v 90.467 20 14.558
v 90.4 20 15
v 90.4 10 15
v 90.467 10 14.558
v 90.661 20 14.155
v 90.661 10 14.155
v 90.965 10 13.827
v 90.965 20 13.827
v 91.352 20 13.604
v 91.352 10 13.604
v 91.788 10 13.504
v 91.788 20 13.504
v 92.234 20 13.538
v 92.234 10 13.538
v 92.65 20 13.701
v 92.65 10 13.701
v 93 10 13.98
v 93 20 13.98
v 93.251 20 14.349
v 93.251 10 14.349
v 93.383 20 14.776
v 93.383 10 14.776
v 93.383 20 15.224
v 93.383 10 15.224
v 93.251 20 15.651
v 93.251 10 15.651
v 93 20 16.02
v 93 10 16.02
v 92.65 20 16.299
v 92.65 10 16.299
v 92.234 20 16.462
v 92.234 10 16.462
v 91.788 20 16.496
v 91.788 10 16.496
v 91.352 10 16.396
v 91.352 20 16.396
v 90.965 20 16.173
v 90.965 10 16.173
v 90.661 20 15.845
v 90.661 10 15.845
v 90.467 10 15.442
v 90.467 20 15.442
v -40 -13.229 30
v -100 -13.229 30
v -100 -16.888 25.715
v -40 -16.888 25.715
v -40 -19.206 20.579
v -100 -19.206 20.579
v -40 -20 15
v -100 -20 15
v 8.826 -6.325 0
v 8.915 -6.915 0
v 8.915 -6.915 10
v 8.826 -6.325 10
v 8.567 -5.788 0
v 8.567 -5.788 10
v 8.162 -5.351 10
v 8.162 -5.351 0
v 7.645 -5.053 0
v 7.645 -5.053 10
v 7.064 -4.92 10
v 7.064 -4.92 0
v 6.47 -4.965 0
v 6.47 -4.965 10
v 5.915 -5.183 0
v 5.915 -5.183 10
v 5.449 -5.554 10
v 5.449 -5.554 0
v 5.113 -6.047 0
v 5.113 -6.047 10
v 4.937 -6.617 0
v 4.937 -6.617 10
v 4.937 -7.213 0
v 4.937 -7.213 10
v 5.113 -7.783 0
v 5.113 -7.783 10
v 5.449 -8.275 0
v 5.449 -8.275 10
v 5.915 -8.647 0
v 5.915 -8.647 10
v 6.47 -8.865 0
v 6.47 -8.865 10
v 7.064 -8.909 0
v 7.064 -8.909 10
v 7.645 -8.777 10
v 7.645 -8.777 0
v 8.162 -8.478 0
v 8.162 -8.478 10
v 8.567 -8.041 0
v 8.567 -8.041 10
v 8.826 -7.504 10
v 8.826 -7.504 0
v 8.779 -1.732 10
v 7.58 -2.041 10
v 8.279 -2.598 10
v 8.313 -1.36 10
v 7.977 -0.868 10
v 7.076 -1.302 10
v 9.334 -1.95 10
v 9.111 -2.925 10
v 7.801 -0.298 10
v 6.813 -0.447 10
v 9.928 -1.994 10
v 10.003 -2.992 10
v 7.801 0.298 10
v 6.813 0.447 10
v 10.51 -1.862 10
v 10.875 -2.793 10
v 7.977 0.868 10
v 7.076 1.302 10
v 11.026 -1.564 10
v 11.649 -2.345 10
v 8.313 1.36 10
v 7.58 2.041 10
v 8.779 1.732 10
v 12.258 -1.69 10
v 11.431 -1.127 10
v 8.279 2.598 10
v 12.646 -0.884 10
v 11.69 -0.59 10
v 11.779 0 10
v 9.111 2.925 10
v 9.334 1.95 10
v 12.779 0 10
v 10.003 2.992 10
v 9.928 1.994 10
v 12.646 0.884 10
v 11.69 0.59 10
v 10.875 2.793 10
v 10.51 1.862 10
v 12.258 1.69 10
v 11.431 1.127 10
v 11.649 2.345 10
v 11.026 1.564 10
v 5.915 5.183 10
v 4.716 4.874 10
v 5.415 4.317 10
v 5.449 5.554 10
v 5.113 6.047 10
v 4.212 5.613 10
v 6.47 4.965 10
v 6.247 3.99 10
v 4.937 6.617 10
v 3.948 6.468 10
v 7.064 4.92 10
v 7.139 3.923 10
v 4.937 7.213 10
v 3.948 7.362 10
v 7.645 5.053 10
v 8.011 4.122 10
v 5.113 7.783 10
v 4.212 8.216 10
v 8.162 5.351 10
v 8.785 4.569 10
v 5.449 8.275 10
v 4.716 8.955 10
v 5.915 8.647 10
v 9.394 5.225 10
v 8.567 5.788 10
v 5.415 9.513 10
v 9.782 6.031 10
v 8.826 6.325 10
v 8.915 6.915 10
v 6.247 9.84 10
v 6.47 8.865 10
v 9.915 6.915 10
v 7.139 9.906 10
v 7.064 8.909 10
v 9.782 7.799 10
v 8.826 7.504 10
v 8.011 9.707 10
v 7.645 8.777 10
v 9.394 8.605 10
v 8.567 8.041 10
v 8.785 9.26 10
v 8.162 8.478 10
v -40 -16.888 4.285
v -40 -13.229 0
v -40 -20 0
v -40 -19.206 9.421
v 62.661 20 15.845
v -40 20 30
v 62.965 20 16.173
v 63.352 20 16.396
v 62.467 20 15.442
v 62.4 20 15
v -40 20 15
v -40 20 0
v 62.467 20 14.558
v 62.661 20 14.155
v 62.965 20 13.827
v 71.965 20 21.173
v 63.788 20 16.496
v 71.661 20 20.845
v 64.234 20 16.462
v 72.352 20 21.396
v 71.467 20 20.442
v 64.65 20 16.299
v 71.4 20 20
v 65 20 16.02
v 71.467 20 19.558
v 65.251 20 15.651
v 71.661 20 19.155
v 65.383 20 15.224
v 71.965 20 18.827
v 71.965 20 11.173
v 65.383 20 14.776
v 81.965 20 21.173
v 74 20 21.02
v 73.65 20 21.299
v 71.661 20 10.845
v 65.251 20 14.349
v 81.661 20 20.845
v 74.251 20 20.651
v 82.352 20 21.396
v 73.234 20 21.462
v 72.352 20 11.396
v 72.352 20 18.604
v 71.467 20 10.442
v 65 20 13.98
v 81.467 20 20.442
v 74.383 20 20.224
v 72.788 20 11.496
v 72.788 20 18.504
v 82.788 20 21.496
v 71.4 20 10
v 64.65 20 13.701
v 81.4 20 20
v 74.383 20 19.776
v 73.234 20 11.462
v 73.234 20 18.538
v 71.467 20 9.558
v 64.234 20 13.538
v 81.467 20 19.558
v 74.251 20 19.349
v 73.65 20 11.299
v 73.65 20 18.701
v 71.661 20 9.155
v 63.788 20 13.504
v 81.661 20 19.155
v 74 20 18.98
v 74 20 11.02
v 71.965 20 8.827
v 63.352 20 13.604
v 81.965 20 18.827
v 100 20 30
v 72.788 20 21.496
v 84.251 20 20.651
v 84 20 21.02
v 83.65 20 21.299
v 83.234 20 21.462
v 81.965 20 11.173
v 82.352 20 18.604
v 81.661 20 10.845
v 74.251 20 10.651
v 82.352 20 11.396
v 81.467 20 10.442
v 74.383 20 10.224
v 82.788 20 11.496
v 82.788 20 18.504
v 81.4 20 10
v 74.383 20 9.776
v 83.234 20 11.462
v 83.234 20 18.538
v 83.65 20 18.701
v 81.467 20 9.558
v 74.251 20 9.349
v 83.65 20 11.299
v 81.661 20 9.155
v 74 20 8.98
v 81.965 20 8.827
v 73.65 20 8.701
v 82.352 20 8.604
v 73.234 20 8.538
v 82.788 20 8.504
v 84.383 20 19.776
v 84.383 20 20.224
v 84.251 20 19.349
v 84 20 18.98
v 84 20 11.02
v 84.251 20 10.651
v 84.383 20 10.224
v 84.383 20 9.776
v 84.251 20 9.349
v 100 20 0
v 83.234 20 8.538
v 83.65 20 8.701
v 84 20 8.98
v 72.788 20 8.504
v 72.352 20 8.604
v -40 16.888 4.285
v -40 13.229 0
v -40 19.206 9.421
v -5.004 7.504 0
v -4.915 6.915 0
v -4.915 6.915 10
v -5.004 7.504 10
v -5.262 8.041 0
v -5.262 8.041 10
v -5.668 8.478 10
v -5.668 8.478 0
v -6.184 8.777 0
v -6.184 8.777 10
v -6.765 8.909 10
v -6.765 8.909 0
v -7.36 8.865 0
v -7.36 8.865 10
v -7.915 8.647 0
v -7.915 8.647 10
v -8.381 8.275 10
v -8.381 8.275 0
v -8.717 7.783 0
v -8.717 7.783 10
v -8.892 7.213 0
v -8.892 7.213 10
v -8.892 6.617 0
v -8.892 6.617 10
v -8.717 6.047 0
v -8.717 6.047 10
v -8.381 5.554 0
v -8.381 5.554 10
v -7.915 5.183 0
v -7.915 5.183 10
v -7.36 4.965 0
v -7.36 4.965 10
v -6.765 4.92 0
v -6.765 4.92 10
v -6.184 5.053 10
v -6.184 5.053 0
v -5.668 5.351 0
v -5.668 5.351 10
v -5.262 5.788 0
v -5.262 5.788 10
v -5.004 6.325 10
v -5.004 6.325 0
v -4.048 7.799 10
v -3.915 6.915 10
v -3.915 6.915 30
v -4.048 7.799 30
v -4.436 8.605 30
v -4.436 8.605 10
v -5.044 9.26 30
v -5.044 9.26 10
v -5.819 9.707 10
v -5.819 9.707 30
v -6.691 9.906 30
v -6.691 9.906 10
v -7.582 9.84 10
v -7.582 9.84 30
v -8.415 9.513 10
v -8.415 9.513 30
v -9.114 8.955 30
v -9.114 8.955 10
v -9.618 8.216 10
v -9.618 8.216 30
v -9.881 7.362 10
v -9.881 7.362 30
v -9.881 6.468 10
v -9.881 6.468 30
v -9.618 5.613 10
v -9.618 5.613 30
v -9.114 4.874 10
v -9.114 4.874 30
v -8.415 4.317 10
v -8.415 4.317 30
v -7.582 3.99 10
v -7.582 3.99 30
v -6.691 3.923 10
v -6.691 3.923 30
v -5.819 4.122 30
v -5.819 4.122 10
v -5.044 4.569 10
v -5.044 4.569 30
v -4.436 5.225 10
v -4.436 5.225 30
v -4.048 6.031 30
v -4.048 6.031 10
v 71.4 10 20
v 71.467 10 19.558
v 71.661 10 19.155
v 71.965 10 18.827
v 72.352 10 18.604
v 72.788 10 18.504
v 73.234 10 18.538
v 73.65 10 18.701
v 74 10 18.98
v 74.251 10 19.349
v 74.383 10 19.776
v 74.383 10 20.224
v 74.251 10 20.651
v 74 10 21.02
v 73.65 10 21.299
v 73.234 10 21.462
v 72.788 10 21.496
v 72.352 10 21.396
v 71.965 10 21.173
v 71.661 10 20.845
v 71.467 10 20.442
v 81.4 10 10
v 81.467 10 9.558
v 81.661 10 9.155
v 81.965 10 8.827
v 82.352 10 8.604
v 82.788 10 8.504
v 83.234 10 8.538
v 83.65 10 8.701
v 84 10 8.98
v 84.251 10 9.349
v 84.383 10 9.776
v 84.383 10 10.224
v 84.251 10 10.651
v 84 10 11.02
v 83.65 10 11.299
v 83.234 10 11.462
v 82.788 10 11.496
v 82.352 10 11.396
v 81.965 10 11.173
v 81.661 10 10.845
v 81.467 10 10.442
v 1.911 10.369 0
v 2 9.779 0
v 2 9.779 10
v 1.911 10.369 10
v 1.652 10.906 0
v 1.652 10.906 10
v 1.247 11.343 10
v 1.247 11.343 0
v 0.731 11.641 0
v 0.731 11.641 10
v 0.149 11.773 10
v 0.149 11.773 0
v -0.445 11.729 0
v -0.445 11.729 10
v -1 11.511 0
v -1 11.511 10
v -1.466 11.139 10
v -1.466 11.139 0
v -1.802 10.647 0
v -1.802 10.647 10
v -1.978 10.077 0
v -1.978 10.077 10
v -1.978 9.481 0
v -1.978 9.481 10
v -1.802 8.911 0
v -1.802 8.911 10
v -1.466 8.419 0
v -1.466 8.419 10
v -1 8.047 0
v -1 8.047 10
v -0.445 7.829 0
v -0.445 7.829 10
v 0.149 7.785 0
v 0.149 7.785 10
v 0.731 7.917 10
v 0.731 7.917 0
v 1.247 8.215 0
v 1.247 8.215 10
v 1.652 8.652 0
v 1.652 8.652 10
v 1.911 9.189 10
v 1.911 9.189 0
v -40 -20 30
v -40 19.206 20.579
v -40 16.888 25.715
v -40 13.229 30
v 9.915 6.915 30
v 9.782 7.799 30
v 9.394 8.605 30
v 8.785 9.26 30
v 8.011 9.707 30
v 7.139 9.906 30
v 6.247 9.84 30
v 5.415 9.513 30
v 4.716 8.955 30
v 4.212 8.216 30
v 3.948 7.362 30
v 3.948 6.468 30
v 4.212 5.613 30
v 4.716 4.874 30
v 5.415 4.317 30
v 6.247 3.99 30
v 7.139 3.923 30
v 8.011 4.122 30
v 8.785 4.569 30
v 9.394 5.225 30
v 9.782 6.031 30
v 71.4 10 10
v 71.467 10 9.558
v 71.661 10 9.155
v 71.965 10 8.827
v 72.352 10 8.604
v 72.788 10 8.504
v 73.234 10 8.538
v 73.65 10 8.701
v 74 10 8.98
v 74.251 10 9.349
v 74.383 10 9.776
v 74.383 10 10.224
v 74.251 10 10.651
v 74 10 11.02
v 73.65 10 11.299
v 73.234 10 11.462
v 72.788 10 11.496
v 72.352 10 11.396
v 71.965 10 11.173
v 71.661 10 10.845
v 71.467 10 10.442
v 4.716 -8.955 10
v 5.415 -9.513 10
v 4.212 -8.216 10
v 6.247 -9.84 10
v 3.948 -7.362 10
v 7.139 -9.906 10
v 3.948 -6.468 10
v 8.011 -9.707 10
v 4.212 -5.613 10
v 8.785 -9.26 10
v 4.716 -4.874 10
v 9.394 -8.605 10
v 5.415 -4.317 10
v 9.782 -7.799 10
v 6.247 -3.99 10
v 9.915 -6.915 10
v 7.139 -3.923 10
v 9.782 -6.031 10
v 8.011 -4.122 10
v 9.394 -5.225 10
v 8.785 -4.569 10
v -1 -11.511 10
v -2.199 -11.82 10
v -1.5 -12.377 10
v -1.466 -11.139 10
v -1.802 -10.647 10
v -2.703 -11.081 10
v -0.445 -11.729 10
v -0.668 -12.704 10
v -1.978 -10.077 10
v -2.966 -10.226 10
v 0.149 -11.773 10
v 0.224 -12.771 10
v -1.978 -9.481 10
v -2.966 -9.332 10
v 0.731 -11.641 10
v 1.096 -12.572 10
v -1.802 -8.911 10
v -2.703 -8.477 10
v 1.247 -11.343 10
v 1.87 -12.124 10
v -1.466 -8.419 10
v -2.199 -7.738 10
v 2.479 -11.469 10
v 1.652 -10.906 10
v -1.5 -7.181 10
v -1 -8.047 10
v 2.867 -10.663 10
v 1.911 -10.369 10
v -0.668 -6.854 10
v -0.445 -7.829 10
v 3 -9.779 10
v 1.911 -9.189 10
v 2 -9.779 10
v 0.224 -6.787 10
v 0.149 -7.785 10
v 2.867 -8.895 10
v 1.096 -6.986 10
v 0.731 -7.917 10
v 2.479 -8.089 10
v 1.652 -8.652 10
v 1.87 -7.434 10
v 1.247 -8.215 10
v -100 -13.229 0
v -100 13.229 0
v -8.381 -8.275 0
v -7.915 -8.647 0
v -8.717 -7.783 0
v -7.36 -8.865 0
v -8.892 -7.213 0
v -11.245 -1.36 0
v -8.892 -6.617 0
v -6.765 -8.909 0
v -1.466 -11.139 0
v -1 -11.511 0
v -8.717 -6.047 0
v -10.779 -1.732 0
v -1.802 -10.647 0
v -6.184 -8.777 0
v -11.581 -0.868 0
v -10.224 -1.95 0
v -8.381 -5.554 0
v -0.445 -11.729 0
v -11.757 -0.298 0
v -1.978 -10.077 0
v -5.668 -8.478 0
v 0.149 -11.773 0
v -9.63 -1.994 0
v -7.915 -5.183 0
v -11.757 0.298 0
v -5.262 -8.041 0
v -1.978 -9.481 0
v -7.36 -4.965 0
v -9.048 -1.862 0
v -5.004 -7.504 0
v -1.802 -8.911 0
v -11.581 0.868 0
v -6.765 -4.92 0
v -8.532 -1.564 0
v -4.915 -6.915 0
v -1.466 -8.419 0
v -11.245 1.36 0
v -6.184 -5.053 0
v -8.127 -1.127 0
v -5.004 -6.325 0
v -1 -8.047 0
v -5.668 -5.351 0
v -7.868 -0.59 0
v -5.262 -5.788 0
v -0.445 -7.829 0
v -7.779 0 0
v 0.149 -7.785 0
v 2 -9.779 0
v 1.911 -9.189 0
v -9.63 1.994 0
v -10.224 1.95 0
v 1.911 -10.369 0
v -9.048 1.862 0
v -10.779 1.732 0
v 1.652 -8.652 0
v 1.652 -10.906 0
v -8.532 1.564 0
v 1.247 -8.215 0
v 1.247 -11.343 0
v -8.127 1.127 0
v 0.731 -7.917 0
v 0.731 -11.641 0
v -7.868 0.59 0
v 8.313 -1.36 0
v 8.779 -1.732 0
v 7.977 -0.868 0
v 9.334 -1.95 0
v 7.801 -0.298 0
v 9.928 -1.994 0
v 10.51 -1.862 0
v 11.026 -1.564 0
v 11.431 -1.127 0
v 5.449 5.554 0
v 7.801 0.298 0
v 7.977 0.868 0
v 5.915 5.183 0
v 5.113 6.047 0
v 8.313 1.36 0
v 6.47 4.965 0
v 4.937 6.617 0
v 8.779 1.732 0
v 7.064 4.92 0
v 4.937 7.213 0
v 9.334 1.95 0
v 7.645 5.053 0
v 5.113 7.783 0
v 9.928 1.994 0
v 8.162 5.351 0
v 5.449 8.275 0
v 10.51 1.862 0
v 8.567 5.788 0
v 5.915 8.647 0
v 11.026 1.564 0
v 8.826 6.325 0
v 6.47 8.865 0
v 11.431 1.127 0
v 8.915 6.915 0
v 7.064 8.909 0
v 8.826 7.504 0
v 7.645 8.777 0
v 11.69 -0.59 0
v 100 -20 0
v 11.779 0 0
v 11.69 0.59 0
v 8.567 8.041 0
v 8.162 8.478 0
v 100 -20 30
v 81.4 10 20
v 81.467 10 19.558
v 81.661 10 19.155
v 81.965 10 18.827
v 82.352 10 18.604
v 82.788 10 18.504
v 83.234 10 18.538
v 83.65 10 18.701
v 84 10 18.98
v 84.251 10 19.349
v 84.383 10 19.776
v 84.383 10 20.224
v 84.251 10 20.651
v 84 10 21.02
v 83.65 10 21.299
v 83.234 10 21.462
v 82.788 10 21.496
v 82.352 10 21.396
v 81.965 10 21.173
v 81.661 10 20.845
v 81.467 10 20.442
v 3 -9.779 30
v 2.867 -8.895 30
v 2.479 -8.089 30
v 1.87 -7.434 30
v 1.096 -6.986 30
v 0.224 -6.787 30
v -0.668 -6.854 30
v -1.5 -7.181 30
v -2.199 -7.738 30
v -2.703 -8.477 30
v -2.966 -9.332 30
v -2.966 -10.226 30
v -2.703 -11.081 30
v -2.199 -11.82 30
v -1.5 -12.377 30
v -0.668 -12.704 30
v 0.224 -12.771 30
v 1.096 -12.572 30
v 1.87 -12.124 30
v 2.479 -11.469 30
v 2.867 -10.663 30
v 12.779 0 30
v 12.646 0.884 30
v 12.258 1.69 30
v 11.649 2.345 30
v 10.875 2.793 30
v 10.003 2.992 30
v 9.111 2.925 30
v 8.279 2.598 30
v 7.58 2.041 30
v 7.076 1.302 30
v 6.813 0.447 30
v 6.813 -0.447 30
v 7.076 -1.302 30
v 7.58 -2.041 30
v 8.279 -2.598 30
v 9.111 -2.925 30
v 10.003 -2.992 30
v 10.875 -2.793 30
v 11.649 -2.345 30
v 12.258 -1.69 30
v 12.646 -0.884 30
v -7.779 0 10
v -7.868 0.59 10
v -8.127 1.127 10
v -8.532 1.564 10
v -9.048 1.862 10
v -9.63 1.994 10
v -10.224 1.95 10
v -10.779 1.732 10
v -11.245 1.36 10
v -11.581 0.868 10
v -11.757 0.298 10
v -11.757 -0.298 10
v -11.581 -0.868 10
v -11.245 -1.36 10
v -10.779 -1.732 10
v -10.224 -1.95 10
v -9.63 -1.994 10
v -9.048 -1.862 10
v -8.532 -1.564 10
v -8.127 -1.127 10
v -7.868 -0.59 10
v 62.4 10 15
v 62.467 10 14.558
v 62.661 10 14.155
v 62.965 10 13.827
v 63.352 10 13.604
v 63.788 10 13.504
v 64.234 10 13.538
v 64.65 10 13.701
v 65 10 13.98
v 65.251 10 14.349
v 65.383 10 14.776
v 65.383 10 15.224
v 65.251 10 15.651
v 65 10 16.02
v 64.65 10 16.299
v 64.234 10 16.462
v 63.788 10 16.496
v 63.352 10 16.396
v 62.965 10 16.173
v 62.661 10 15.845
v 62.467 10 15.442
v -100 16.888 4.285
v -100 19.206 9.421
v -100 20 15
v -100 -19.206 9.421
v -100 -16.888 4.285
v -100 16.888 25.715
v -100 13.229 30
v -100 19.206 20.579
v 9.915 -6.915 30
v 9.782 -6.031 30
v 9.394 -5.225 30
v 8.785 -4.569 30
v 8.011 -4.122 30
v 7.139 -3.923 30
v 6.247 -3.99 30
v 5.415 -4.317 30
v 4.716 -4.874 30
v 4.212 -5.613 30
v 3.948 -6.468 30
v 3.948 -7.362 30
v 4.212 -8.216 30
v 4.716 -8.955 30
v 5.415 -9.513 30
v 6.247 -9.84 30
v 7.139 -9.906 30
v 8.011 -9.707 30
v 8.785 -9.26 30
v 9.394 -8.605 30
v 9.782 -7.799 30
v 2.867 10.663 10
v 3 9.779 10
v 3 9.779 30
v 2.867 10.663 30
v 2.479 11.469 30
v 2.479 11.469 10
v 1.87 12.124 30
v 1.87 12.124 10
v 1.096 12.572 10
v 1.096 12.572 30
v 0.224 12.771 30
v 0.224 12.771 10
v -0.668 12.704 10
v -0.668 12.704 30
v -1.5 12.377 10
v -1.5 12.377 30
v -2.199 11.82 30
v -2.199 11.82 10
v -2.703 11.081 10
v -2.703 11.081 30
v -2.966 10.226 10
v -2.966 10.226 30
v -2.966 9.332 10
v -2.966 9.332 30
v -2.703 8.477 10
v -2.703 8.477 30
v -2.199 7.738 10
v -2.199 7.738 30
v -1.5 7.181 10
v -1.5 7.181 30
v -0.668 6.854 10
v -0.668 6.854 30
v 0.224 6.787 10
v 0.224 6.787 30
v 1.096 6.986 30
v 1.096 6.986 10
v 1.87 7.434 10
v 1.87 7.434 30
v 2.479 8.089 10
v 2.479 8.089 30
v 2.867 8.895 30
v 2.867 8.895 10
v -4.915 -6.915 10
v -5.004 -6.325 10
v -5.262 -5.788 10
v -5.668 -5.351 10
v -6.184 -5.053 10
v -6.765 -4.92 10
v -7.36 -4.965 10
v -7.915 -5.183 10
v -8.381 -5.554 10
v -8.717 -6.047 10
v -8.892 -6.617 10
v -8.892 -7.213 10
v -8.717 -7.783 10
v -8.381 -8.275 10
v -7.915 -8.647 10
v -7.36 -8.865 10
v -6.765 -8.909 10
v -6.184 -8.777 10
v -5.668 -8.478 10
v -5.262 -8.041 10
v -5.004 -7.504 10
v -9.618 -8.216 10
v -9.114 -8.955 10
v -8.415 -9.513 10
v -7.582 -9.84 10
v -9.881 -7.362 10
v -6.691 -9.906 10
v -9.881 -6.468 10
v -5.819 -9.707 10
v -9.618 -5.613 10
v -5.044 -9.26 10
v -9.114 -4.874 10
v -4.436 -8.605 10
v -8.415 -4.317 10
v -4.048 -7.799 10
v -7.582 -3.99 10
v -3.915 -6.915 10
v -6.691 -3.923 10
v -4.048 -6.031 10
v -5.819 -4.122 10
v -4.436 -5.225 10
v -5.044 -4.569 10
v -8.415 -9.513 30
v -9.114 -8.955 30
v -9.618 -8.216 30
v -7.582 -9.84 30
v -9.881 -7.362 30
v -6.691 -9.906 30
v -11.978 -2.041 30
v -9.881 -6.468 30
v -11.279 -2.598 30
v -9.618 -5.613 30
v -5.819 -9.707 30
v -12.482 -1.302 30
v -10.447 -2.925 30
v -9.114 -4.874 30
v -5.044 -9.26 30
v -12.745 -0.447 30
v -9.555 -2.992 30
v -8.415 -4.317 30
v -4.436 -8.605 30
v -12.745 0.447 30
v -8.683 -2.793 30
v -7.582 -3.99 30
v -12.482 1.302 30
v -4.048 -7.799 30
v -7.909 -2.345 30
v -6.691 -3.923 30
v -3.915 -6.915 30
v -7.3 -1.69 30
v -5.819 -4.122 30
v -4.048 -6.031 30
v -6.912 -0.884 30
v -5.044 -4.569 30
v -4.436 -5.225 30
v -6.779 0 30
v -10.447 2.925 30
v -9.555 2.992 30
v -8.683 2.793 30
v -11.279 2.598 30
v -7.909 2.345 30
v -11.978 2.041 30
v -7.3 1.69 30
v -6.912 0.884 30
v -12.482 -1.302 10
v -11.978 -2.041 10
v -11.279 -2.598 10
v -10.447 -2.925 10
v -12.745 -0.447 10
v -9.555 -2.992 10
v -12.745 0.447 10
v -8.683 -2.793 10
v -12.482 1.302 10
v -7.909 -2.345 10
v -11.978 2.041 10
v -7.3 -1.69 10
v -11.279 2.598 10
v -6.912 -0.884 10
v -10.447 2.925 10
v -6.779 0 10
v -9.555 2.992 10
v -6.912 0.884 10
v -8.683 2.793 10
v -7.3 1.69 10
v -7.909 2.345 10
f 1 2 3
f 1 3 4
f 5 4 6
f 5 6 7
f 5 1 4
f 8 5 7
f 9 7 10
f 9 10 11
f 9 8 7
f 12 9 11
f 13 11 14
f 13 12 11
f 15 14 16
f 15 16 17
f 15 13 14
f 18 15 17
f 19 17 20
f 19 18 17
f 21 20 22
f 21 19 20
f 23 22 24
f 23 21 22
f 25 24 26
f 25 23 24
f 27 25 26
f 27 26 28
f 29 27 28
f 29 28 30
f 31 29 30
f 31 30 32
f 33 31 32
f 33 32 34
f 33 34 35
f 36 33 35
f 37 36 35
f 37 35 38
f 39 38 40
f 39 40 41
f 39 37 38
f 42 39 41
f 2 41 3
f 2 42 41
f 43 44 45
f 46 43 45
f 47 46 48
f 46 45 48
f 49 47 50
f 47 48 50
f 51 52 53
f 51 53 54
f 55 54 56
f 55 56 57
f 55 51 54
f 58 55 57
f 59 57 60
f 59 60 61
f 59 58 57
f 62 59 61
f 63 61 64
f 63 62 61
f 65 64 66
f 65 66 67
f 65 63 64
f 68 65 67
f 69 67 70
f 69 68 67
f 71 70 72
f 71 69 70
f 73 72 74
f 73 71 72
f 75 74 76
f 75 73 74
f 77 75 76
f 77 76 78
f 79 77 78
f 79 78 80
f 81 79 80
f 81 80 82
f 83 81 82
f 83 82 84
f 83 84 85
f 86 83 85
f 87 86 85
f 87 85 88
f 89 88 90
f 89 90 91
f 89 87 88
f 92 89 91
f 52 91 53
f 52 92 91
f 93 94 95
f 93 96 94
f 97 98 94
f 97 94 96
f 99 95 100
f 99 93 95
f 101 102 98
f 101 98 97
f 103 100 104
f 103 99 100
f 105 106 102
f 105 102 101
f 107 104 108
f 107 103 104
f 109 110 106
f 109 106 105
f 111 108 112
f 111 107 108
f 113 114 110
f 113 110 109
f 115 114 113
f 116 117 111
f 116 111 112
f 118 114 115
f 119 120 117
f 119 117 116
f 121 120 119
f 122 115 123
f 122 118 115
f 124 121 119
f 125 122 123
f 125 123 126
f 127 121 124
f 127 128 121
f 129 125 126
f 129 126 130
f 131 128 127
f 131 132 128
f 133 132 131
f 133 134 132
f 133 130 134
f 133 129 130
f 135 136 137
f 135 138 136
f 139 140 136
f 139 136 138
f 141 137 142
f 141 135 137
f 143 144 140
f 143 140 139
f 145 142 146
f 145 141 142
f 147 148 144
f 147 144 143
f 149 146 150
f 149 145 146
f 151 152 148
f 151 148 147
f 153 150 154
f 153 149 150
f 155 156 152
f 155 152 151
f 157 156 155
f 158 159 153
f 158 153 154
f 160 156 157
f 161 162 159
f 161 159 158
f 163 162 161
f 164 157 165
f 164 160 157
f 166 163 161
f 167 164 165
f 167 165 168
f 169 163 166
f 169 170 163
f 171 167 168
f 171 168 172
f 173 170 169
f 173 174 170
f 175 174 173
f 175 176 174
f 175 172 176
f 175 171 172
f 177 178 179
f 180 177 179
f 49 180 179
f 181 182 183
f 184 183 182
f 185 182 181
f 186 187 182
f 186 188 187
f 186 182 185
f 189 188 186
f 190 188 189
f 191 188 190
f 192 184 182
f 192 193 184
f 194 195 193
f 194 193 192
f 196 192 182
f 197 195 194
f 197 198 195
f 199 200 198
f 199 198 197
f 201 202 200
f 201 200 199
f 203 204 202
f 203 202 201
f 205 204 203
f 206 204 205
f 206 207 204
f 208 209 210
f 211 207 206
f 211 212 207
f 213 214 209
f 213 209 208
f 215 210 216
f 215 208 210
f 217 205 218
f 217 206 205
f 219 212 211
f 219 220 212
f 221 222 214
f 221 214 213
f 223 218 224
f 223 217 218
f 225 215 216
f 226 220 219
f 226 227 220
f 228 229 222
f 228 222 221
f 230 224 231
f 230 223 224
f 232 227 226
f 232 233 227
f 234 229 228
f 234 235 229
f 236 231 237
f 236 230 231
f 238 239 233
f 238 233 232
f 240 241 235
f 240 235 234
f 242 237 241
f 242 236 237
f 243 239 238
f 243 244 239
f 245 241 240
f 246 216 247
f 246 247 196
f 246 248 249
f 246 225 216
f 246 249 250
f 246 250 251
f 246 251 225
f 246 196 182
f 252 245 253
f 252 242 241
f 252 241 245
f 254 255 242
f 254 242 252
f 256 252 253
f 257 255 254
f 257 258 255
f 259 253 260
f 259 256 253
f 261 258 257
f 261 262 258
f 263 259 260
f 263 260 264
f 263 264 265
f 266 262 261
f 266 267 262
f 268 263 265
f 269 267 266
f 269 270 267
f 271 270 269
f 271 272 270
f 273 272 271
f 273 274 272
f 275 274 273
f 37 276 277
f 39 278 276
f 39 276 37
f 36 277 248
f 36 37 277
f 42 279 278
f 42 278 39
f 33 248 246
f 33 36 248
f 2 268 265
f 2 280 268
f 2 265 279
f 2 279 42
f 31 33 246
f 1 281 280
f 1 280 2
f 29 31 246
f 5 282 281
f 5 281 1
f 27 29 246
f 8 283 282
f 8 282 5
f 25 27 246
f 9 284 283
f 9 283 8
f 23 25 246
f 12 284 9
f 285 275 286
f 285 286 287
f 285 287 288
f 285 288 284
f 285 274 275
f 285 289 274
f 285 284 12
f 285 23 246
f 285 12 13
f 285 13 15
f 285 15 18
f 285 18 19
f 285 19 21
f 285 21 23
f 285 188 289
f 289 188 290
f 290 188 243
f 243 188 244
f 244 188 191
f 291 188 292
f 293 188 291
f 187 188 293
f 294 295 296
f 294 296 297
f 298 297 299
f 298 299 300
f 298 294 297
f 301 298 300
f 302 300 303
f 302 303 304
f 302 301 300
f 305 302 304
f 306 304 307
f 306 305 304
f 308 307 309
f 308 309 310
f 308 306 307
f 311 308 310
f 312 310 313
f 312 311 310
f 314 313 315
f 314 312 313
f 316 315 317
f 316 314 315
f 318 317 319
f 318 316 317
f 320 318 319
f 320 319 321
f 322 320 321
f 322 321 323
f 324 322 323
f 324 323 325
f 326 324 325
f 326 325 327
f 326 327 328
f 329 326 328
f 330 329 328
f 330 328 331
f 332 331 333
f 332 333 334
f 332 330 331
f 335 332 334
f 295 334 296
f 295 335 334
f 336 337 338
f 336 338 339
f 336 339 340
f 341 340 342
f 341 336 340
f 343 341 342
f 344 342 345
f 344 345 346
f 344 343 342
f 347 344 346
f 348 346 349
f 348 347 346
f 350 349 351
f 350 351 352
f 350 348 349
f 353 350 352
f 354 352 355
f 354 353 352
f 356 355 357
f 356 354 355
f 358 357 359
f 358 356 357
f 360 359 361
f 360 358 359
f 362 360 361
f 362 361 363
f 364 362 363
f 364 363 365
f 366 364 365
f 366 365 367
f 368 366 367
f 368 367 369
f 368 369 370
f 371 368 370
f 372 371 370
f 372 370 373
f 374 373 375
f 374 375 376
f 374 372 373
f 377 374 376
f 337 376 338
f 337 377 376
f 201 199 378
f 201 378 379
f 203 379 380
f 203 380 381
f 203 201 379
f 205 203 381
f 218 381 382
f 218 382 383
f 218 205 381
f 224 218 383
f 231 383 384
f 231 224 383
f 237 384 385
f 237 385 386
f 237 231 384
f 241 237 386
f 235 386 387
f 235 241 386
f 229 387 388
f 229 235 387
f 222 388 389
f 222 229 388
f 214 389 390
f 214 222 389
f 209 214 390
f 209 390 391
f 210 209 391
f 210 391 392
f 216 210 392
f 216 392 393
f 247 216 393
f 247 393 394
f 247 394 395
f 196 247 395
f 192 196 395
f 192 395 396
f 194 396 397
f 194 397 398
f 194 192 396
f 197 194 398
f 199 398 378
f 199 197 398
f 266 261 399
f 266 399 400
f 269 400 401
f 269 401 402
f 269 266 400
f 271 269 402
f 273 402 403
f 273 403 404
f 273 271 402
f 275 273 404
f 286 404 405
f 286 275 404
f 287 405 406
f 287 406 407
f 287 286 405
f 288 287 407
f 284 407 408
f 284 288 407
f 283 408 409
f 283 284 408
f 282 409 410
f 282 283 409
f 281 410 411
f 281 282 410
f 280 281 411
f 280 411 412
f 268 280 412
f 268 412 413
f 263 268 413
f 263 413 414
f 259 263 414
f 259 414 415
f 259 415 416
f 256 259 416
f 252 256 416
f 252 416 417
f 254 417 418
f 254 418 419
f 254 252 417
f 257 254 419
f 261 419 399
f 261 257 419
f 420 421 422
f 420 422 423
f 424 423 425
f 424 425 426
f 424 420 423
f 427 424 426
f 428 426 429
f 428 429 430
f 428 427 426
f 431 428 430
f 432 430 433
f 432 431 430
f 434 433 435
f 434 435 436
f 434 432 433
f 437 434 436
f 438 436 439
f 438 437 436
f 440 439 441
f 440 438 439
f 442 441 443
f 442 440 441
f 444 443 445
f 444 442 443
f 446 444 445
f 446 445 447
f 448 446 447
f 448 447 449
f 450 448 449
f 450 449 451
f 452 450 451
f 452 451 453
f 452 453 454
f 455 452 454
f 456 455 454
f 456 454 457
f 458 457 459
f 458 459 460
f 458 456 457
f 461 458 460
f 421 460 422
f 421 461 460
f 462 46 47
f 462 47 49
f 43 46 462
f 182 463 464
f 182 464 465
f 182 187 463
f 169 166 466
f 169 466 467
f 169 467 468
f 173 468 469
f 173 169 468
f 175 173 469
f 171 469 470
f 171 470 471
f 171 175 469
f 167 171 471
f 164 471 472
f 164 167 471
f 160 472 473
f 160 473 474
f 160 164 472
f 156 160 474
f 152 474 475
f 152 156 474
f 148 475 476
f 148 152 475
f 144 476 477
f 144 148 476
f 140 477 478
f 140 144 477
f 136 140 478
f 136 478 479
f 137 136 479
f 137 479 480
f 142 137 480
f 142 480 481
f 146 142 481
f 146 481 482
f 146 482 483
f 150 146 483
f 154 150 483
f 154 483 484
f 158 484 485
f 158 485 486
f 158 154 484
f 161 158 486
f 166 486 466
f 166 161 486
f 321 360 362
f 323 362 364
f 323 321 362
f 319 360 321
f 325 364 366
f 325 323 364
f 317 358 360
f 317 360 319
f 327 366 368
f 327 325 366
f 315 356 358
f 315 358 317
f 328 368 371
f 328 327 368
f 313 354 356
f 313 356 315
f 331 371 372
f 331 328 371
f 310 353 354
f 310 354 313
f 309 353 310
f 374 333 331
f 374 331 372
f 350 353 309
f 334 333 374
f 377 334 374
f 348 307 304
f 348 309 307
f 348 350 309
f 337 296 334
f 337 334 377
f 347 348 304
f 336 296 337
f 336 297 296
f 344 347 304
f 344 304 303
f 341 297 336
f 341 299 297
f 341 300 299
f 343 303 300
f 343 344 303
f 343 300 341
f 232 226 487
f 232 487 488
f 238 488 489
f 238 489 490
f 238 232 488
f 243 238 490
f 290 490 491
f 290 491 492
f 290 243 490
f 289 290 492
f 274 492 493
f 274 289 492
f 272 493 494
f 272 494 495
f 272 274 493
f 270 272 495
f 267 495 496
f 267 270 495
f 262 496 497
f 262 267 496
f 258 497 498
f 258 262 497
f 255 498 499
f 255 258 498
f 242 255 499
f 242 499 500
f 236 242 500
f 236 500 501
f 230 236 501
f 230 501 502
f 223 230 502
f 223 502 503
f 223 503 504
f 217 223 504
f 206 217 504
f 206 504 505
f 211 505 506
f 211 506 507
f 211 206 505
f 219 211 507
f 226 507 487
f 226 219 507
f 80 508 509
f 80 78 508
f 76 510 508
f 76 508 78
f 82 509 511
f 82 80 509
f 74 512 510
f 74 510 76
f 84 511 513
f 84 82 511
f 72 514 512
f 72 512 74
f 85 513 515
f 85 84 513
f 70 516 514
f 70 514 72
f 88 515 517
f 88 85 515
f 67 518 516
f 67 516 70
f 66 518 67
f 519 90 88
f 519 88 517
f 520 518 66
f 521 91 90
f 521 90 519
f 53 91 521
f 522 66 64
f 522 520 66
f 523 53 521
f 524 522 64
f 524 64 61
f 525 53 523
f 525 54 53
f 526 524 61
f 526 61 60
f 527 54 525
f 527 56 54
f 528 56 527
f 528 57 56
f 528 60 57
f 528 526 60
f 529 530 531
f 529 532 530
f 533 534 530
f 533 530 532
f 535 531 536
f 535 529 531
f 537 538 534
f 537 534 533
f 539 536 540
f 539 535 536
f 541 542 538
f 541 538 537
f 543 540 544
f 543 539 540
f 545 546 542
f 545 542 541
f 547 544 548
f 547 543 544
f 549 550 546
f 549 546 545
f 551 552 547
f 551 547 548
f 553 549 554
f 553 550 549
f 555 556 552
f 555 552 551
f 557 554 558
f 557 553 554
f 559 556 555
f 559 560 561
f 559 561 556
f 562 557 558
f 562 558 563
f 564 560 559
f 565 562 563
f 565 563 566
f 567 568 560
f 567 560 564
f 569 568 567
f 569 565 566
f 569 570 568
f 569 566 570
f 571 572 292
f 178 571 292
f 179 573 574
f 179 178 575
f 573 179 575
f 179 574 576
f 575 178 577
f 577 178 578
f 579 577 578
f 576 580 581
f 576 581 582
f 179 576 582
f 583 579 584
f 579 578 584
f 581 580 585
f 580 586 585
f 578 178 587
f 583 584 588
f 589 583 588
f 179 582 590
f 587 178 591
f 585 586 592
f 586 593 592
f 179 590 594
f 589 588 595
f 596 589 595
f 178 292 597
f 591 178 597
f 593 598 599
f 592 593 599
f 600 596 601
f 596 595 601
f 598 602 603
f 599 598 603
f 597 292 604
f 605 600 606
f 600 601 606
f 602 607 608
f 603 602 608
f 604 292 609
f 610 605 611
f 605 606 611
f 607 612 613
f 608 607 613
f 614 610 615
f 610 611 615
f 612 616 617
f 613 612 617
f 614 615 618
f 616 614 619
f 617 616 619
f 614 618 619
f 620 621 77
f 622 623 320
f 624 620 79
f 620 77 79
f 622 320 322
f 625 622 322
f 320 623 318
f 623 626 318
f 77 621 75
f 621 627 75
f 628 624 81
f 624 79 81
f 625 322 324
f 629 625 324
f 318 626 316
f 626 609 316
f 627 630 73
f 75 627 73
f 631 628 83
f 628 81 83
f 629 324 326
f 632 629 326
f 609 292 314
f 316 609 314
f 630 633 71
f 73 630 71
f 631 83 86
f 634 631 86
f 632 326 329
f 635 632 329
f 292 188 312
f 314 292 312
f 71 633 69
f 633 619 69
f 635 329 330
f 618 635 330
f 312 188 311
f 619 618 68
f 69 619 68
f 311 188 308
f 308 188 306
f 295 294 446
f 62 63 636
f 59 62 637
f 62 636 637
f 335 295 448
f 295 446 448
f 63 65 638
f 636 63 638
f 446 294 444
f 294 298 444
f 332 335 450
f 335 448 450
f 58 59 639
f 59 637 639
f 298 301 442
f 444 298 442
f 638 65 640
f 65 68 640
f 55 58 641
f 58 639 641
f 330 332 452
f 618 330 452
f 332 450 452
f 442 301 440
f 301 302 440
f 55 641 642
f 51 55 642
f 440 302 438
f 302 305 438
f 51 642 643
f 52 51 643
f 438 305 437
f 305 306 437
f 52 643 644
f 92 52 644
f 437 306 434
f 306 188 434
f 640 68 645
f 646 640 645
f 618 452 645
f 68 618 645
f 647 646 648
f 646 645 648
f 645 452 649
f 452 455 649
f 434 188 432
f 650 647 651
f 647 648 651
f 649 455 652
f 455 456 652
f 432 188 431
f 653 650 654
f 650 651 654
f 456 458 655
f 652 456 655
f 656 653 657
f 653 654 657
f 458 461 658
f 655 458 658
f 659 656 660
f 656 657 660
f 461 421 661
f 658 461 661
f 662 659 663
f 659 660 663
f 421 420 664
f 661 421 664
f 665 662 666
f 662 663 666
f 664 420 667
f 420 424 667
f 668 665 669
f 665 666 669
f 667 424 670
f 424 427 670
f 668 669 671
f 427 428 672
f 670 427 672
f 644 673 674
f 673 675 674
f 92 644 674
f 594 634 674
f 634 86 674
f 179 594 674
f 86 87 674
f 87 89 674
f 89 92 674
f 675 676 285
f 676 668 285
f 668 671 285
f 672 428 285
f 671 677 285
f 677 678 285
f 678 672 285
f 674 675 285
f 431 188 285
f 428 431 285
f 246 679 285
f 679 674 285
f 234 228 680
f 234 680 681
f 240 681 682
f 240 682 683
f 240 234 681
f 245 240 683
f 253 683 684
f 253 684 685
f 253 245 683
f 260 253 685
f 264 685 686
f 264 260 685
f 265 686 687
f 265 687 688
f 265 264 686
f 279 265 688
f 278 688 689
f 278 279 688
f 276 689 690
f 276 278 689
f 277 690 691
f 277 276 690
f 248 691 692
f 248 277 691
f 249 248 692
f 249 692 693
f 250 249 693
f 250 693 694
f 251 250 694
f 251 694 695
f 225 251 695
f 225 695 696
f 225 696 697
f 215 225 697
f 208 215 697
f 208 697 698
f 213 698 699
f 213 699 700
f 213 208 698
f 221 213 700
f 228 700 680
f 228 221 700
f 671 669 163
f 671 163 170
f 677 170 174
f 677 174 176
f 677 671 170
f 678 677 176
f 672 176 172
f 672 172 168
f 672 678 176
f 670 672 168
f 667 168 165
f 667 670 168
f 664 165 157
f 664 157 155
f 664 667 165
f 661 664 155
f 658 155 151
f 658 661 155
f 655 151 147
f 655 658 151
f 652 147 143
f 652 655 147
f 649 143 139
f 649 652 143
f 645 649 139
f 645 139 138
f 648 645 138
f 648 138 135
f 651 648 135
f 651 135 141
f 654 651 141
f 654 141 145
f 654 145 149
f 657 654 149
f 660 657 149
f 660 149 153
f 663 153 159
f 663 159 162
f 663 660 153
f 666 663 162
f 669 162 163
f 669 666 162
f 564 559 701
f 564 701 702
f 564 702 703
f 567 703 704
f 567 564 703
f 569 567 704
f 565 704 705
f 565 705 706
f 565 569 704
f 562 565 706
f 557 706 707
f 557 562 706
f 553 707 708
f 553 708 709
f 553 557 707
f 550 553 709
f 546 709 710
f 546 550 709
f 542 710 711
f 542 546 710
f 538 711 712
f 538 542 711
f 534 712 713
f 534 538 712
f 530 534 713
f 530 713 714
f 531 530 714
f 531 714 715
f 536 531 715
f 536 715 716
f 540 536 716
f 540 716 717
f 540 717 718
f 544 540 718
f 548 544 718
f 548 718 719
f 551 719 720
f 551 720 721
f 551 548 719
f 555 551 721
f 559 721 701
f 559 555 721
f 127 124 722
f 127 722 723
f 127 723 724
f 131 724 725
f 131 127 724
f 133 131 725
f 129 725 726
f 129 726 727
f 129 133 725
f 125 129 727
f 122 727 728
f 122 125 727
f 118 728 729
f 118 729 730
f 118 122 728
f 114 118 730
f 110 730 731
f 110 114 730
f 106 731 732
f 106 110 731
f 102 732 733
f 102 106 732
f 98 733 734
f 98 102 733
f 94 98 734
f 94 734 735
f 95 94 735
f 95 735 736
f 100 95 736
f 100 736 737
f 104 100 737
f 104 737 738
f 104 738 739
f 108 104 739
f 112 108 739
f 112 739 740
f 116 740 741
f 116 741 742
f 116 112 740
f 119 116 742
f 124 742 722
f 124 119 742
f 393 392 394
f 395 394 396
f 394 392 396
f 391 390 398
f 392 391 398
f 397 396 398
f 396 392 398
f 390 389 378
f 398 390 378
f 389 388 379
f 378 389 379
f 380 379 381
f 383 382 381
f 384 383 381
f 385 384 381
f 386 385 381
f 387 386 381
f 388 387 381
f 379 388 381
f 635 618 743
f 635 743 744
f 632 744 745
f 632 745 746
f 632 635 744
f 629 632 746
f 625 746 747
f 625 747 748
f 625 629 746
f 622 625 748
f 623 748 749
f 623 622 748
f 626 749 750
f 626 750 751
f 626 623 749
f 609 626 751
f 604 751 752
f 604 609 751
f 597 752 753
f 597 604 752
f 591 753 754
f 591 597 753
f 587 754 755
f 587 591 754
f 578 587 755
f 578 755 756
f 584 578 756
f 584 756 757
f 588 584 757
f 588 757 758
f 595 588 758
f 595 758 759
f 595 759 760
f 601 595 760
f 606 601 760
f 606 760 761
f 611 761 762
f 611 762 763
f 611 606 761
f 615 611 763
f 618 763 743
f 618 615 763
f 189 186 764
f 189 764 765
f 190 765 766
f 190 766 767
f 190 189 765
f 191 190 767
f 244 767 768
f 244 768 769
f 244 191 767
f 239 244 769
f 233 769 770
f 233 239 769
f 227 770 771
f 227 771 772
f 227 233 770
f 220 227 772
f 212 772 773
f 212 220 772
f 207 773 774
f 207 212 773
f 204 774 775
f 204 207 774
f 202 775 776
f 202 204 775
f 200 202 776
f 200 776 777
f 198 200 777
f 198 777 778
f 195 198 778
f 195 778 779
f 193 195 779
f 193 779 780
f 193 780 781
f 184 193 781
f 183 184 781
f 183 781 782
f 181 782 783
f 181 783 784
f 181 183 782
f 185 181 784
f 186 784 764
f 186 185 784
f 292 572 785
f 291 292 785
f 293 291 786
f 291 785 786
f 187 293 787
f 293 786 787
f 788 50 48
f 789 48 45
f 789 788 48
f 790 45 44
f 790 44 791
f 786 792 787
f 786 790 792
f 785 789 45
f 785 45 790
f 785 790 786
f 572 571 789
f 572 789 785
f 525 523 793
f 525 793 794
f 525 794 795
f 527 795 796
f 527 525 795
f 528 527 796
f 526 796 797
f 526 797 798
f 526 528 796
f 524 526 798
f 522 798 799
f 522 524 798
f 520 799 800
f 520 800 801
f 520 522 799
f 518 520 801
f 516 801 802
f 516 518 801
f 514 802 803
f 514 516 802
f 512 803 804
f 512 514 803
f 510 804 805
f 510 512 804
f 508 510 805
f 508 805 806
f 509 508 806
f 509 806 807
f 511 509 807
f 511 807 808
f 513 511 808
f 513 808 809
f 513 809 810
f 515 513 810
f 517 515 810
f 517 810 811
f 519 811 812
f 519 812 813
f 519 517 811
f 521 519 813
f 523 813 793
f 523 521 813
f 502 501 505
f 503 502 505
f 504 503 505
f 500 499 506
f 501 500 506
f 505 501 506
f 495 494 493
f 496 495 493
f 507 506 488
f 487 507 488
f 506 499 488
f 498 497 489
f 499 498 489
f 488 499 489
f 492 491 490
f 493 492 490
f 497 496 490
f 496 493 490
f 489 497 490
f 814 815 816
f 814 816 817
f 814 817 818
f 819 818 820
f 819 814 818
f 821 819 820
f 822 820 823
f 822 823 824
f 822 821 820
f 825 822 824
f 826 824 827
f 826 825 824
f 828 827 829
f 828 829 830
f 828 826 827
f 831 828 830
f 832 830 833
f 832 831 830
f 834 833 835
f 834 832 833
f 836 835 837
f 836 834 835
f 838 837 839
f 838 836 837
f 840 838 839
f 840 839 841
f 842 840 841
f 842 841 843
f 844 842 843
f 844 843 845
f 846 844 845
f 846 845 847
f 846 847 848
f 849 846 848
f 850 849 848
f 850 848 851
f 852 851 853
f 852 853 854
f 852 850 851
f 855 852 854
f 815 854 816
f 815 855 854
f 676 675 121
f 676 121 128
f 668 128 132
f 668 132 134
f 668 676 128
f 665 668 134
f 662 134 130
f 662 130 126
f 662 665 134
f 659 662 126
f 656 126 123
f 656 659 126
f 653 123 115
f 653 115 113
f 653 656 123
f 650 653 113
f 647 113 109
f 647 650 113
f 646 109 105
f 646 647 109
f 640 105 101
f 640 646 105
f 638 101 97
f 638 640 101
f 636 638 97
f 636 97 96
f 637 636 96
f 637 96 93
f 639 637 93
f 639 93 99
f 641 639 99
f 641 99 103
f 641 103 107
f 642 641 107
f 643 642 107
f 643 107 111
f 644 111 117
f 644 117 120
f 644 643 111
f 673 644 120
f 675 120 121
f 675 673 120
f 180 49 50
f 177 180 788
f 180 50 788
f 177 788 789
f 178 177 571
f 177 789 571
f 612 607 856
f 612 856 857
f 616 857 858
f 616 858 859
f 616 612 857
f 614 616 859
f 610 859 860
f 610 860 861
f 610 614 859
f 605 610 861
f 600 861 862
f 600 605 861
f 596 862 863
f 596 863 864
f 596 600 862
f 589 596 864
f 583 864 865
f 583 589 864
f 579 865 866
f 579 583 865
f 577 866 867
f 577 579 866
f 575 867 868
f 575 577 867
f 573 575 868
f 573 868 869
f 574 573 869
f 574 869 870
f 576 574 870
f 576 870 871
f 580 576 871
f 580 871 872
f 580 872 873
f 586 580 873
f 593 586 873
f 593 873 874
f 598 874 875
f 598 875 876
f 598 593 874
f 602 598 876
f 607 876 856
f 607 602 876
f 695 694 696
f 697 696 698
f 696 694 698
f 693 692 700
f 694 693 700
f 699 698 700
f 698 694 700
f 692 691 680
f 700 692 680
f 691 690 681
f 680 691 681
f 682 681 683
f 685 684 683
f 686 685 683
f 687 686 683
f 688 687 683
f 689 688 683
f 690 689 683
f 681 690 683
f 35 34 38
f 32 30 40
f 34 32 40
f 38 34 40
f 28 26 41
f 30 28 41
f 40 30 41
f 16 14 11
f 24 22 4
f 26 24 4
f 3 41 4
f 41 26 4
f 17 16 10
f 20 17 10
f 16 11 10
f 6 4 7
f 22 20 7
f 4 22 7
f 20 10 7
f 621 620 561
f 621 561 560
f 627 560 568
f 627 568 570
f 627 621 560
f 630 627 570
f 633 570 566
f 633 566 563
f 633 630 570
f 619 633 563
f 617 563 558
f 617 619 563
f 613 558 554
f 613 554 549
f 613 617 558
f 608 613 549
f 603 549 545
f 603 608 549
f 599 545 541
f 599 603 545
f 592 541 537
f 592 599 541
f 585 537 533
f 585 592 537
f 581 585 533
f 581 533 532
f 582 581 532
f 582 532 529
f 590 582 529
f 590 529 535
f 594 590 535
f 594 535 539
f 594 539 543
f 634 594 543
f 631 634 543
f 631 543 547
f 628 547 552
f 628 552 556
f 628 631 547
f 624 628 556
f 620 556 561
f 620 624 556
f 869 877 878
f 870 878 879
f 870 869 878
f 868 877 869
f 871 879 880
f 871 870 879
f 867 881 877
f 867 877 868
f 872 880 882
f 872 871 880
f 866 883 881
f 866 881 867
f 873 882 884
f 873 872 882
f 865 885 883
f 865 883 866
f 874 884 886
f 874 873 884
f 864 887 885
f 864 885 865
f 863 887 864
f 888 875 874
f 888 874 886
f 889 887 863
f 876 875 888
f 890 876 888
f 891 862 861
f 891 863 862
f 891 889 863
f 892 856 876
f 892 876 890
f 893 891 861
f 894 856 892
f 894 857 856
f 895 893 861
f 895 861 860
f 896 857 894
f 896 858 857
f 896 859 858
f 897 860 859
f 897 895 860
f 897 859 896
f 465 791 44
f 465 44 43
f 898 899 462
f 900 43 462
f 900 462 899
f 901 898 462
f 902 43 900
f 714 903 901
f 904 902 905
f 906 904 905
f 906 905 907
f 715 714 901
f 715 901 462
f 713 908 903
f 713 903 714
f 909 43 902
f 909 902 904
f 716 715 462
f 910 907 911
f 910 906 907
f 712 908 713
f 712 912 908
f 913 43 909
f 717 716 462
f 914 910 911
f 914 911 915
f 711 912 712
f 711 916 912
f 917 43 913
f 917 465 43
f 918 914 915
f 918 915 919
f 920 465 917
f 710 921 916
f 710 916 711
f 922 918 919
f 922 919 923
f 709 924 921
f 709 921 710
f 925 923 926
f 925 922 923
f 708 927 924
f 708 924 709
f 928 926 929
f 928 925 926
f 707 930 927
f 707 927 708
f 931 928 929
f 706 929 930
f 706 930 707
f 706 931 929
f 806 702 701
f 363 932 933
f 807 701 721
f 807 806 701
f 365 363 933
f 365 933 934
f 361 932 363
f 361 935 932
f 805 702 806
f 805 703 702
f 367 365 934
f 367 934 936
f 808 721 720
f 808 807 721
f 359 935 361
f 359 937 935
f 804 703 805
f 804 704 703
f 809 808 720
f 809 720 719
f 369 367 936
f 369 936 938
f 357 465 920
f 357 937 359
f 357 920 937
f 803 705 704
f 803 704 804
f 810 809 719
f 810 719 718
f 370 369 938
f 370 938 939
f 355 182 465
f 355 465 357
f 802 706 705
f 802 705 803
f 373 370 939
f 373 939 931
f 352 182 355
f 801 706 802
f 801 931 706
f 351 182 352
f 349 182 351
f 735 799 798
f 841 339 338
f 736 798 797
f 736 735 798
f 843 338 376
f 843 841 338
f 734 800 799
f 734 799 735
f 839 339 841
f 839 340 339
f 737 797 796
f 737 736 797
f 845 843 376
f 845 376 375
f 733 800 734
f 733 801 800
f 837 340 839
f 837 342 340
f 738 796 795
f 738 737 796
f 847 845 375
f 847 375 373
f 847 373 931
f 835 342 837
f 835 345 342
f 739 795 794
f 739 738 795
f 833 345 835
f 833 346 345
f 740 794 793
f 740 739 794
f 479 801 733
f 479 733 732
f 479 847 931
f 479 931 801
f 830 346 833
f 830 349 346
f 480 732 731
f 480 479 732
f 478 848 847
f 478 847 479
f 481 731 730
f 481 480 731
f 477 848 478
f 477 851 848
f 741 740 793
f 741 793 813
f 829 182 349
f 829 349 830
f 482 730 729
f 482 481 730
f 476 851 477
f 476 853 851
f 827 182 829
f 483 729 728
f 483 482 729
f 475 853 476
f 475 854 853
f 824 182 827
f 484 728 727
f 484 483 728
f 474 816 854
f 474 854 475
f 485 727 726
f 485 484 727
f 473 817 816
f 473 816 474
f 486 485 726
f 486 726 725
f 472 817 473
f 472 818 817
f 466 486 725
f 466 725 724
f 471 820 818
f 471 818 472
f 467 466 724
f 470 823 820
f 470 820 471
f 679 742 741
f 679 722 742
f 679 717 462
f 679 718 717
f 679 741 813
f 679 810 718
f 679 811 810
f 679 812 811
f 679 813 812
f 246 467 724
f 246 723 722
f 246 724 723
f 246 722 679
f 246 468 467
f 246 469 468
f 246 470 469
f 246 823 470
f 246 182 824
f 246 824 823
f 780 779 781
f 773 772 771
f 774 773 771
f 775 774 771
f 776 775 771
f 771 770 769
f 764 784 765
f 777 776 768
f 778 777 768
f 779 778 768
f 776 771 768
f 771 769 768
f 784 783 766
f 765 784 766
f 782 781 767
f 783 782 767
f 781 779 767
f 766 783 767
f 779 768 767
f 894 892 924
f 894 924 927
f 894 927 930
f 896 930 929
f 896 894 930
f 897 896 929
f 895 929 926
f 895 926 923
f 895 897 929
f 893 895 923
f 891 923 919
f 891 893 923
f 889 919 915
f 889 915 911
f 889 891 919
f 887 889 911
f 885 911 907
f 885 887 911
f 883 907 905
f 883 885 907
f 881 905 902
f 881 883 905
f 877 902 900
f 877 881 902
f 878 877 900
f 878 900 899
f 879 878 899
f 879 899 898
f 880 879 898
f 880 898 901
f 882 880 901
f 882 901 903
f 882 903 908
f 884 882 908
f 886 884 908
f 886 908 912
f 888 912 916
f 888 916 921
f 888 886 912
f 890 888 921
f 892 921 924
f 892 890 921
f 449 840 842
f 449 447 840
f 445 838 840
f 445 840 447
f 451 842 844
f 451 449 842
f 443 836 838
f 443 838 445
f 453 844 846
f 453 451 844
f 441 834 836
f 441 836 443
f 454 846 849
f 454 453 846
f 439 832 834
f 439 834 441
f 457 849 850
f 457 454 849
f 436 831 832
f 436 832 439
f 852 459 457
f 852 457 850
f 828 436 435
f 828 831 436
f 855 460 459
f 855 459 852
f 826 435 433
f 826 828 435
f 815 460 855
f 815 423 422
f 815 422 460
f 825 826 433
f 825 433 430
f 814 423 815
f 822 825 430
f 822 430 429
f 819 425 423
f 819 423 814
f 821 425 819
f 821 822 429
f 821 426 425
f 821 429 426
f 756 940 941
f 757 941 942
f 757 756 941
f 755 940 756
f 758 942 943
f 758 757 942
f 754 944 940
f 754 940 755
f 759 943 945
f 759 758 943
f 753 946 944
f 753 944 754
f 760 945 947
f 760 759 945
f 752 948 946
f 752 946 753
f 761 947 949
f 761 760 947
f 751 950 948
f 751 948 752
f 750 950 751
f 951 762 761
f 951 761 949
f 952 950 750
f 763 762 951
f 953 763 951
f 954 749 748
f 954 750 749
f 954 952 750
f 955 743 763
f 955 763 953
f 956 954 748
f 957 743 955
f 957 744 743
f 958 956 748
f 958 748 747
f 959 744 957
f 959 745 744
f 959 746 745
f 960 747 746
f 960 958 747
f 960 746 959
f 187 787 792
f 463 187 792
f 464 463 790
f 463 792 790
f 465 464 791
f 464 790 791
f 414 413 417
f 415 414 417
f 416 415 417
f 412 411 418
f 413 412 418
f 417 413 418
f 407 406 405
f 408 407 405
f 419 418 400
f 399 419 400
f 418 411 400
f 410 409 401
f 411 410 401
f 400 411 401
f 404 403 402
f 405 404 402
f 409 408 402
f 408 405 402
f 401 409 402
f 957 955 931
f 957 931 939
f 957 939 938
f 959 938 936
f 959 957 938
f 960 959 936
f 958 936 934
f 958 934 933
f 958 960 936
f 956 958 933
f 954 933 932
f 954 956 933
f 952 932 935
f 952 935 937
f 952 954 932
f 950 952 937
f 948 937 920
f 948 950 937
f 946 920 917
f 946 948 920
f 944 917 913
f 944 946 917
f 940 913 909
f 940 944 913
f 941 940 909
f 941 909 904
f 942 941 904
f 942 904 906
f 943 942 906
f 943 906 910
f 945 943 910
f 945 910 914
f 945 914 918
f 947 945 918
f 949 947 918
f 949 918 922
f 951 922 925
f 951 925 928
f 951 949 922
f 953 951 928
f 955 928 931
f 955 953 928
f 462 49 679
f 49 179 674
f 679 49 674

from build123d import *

# Parameters (mm, degrees)
CROQUIS1_W              = 200
CROQUIS1_H              = 40
CROQUIS1_R              = 2
SALIENTE_EXTRUIR1_DEPTH = 10
CROQUIS2_W              = 200
CROQUIS2_H              = 7
SALIENTE_EXTRUIR3_DEPTH = 20
CROQUIS3_W              = 84
CROQUIS3_H              = 26
SALIENTE_EXTRUIR4_DEPTH = 20
CROQUIS5_R              = 1.5
CORTAR_EXTRUIR1_DEPTH   = 10
CORTAR_EXTRUIR2_DEPTH   = 60
CROQUIS8_W              = 32
CROQUIS8_H              = 26
SALIENTE_EXTRUIR5_DEPTH = 20
CROQUIS7_R              = 3
CORTAR_EXTRUIR3_DEPTH   = 20


with BuildPart() as part:
    # Croquis1 → Saliente-Extruir1 (new body)
    with BuildSketch(Plane.XY):
        Rectangle(CROQUIS1_W, CROQUIS1_H)
        with Locations((0, 9.779)):
            Circle(CROQUIS1_R, mode=Mode.SUBTRACT)
        with Locations((6.914797213, 6.914797213)):
            Circle(CROQUIS1_R, mode=Mode.SUBTRACT)
        with Locations((9.779, 0)):
            Circle(CROQUIS1_R, mode=Mode.SUBTRACT)
        with Locations((6.914797213, -6.914797213)):
            Circle(CROQUIS1_R, mode=Mode.SUBTRACT)
        with Locations((0, -9.779)):
            Circle(CROQUIS1_R, mode=Mode.SUBTRACT)
        with Locations((-6.914797213, -6.914797213)):
            Circle(CROQUIS1_R, mode=Mode.SUBTRACT)
        with Locations((-9.779, 0)):
            Circle(CROQUIS1_R, mode=Mode.SUBTRACT)
        with Locations((-6.914797213, 6.914797213)):
            Circle(CROQUIS1_R, mode=Mode.SUBTRACT)
    extrude(amount=SALIENTE_EXTRUIR1_DEPTH)

    # Croquis2 → Saliente-Extruir3 (add)
    with BuildSketch(Plane.XY.offset(10)):
        with Locations((0, -16.5)):
            Rectangle(CROQUIS2_W, CROQUIS2_H)
        with Locations((0, 16.5)):
            Rectangle(CROQUIS2_W, CROQUIS2_H)
    extrude(amount=SALIENTE_EXTRUIR3_DEPTH)

    # Croquis3 → Saliente-Extruir4 (add)
    with BuildSketch(Plane.XY.offset(10)):
        with Locations((-58, 0)):
            Rectangle(CROQUIS3_W, CROQUIS3_H)
        with Locations((58, 0)):
            Rectangle(CROQUIS3_W, CROQUIS3_H)
    extrude(amount=SALIENTE_EXTRUIR4_DEPTH)

    # Croquis5 → Cortar-Extruir1 (cut)
    with BuildSketch(Plane(origin=(0, 20, 0), x_dir=(-1, 0, 0), z_dir=(0, -1, 0))):
        with Locations((-63.9, -15)):
            Circle(CROQUIS5_R)
        with Locations((-72.9, -10)):
            Circle(CROQUIS5_R)
        with Locations((-72.9, -20)):
            Circle(CROQUIS5_R)
        with Locations((-82.9, -20)):
            Circle(CROQUIS5_R)
        with Locations((-82.9, -10)):
            Circle(CROQUIS5_R)
        with Locations((-91.9, -15)):
            Circle(CROQUIS5_R)
    extrude(amount=CORTAR_EXTRUIR1_DEPTH, mode=Mode.SUBTRACT)

    # Croquis6 → Cortar-Extruir2 (cut)
    with BuildSketch(Plane.ZY.offset(100)):
        with BuildLine():
            Line((-8.93194877, 20), (-8.93194877, -20))
            Line((-8.93194877, -20), (0, -20))
            Line((0, -20), (0, -13.228756555))
            ThreePointArc((0, -13.228756555), (-5, 0), (0, 13.228756555))
            Line((0, 13.228756555), (0, 20))
            Line((0, 20), (-8.93194877, 20))
        make_face()
        with BuildLine():
            Line((30, -13.228756555), (30, -20))
            Line((30, -20), (38.93194877, -20))
            Line((38.93194877, -20), (38.93194877, 20))
            Line((38.93194877, 20), (30, 20))
            Line((30, 20), (30, 13.228756555))
            ThreePointArc((30, 13.228756555), (33.708286934, 7.071067812), (35, 0))
            ThreePointArc((35, 0), (33.708286934, -7.071067812), (30, -13.228756555))
        make_face()
        with BuildLine():
            ThreePointArc((30, -13.228756555), (23.228756555, -18.228756555), (15, -20))
            Line((15, -20), (30, -20))
            Line((30, -20), (30, -13.228756555))
        make_face()
        with BuildLine():
            Line((0, -13.228756555), (0, -20))
            Line((0, -20), (15, -20))
            ThreePointArc((15, -20), (6.771243445, -18.228756555), (0, -13.228756555))
        make_face()
        with BuildLine():
            Line((15, 20), (0, 20))
            Line((0, 20), (0, 13.228756555))
            ThreePointArc((0, 13.228756555), (6.771243445, 18.228756555), (15, 20))
        make_face()
        with BuildLine():
            Line((30, 20), (15, 20))
            ThreePointArc((15, 20), (23.228756555, 18.228756555), (30, 13.228756555))
            Line((30, 13.228756555), (30, 20))
        make_face()
    extrude(amount=-CORTAR_EXTRUIR2_DEPTH, mode=Mode.SUBTRACT)

    # Croquis8 → Saliente-Extruir5 (add)
    with BuildSketch(Plane.XY.offset(10)):
        Rectangle(CROQUIS8_W, CROQUIS8_H)
    extrude(amount=SALIENTE_EXTRUIR5_DEPTH)

    # Croquis7 → Cortar-Extruir3 (cut)
    with BuildSketch(Plane.XY.offset(10)):
        with Locations((0, 9.779)):
            Circle(CROQUIS7_R)
        with Locations((-6.914797213, 6.914797213)):
            Circle(CROQUIS7_R)
        with Locations((-9.779, 0)):
            Circle(CROQUIS7_R)
        with Locations((6.914797213, 6.914797213)):
            Circle(CROQUIS7_R)
        with Locations((9.779, 0)):
            Circle(CROQUIS7_R)
        with Locations((-6.914797213, -6.914797213)):
            Circle(CROQUIS7_R)
        with Locations((6.914797213, -6.914797213)):
            Circle(CROQUIS7_R)
        with Locations((0, -9.779)):
            Circle(CROQUIS7_R)
    extrude(amount=CORTAR_EXTRUIR3_DEPTH, mode=Mode.SUBTRACT)


solid = part.part
